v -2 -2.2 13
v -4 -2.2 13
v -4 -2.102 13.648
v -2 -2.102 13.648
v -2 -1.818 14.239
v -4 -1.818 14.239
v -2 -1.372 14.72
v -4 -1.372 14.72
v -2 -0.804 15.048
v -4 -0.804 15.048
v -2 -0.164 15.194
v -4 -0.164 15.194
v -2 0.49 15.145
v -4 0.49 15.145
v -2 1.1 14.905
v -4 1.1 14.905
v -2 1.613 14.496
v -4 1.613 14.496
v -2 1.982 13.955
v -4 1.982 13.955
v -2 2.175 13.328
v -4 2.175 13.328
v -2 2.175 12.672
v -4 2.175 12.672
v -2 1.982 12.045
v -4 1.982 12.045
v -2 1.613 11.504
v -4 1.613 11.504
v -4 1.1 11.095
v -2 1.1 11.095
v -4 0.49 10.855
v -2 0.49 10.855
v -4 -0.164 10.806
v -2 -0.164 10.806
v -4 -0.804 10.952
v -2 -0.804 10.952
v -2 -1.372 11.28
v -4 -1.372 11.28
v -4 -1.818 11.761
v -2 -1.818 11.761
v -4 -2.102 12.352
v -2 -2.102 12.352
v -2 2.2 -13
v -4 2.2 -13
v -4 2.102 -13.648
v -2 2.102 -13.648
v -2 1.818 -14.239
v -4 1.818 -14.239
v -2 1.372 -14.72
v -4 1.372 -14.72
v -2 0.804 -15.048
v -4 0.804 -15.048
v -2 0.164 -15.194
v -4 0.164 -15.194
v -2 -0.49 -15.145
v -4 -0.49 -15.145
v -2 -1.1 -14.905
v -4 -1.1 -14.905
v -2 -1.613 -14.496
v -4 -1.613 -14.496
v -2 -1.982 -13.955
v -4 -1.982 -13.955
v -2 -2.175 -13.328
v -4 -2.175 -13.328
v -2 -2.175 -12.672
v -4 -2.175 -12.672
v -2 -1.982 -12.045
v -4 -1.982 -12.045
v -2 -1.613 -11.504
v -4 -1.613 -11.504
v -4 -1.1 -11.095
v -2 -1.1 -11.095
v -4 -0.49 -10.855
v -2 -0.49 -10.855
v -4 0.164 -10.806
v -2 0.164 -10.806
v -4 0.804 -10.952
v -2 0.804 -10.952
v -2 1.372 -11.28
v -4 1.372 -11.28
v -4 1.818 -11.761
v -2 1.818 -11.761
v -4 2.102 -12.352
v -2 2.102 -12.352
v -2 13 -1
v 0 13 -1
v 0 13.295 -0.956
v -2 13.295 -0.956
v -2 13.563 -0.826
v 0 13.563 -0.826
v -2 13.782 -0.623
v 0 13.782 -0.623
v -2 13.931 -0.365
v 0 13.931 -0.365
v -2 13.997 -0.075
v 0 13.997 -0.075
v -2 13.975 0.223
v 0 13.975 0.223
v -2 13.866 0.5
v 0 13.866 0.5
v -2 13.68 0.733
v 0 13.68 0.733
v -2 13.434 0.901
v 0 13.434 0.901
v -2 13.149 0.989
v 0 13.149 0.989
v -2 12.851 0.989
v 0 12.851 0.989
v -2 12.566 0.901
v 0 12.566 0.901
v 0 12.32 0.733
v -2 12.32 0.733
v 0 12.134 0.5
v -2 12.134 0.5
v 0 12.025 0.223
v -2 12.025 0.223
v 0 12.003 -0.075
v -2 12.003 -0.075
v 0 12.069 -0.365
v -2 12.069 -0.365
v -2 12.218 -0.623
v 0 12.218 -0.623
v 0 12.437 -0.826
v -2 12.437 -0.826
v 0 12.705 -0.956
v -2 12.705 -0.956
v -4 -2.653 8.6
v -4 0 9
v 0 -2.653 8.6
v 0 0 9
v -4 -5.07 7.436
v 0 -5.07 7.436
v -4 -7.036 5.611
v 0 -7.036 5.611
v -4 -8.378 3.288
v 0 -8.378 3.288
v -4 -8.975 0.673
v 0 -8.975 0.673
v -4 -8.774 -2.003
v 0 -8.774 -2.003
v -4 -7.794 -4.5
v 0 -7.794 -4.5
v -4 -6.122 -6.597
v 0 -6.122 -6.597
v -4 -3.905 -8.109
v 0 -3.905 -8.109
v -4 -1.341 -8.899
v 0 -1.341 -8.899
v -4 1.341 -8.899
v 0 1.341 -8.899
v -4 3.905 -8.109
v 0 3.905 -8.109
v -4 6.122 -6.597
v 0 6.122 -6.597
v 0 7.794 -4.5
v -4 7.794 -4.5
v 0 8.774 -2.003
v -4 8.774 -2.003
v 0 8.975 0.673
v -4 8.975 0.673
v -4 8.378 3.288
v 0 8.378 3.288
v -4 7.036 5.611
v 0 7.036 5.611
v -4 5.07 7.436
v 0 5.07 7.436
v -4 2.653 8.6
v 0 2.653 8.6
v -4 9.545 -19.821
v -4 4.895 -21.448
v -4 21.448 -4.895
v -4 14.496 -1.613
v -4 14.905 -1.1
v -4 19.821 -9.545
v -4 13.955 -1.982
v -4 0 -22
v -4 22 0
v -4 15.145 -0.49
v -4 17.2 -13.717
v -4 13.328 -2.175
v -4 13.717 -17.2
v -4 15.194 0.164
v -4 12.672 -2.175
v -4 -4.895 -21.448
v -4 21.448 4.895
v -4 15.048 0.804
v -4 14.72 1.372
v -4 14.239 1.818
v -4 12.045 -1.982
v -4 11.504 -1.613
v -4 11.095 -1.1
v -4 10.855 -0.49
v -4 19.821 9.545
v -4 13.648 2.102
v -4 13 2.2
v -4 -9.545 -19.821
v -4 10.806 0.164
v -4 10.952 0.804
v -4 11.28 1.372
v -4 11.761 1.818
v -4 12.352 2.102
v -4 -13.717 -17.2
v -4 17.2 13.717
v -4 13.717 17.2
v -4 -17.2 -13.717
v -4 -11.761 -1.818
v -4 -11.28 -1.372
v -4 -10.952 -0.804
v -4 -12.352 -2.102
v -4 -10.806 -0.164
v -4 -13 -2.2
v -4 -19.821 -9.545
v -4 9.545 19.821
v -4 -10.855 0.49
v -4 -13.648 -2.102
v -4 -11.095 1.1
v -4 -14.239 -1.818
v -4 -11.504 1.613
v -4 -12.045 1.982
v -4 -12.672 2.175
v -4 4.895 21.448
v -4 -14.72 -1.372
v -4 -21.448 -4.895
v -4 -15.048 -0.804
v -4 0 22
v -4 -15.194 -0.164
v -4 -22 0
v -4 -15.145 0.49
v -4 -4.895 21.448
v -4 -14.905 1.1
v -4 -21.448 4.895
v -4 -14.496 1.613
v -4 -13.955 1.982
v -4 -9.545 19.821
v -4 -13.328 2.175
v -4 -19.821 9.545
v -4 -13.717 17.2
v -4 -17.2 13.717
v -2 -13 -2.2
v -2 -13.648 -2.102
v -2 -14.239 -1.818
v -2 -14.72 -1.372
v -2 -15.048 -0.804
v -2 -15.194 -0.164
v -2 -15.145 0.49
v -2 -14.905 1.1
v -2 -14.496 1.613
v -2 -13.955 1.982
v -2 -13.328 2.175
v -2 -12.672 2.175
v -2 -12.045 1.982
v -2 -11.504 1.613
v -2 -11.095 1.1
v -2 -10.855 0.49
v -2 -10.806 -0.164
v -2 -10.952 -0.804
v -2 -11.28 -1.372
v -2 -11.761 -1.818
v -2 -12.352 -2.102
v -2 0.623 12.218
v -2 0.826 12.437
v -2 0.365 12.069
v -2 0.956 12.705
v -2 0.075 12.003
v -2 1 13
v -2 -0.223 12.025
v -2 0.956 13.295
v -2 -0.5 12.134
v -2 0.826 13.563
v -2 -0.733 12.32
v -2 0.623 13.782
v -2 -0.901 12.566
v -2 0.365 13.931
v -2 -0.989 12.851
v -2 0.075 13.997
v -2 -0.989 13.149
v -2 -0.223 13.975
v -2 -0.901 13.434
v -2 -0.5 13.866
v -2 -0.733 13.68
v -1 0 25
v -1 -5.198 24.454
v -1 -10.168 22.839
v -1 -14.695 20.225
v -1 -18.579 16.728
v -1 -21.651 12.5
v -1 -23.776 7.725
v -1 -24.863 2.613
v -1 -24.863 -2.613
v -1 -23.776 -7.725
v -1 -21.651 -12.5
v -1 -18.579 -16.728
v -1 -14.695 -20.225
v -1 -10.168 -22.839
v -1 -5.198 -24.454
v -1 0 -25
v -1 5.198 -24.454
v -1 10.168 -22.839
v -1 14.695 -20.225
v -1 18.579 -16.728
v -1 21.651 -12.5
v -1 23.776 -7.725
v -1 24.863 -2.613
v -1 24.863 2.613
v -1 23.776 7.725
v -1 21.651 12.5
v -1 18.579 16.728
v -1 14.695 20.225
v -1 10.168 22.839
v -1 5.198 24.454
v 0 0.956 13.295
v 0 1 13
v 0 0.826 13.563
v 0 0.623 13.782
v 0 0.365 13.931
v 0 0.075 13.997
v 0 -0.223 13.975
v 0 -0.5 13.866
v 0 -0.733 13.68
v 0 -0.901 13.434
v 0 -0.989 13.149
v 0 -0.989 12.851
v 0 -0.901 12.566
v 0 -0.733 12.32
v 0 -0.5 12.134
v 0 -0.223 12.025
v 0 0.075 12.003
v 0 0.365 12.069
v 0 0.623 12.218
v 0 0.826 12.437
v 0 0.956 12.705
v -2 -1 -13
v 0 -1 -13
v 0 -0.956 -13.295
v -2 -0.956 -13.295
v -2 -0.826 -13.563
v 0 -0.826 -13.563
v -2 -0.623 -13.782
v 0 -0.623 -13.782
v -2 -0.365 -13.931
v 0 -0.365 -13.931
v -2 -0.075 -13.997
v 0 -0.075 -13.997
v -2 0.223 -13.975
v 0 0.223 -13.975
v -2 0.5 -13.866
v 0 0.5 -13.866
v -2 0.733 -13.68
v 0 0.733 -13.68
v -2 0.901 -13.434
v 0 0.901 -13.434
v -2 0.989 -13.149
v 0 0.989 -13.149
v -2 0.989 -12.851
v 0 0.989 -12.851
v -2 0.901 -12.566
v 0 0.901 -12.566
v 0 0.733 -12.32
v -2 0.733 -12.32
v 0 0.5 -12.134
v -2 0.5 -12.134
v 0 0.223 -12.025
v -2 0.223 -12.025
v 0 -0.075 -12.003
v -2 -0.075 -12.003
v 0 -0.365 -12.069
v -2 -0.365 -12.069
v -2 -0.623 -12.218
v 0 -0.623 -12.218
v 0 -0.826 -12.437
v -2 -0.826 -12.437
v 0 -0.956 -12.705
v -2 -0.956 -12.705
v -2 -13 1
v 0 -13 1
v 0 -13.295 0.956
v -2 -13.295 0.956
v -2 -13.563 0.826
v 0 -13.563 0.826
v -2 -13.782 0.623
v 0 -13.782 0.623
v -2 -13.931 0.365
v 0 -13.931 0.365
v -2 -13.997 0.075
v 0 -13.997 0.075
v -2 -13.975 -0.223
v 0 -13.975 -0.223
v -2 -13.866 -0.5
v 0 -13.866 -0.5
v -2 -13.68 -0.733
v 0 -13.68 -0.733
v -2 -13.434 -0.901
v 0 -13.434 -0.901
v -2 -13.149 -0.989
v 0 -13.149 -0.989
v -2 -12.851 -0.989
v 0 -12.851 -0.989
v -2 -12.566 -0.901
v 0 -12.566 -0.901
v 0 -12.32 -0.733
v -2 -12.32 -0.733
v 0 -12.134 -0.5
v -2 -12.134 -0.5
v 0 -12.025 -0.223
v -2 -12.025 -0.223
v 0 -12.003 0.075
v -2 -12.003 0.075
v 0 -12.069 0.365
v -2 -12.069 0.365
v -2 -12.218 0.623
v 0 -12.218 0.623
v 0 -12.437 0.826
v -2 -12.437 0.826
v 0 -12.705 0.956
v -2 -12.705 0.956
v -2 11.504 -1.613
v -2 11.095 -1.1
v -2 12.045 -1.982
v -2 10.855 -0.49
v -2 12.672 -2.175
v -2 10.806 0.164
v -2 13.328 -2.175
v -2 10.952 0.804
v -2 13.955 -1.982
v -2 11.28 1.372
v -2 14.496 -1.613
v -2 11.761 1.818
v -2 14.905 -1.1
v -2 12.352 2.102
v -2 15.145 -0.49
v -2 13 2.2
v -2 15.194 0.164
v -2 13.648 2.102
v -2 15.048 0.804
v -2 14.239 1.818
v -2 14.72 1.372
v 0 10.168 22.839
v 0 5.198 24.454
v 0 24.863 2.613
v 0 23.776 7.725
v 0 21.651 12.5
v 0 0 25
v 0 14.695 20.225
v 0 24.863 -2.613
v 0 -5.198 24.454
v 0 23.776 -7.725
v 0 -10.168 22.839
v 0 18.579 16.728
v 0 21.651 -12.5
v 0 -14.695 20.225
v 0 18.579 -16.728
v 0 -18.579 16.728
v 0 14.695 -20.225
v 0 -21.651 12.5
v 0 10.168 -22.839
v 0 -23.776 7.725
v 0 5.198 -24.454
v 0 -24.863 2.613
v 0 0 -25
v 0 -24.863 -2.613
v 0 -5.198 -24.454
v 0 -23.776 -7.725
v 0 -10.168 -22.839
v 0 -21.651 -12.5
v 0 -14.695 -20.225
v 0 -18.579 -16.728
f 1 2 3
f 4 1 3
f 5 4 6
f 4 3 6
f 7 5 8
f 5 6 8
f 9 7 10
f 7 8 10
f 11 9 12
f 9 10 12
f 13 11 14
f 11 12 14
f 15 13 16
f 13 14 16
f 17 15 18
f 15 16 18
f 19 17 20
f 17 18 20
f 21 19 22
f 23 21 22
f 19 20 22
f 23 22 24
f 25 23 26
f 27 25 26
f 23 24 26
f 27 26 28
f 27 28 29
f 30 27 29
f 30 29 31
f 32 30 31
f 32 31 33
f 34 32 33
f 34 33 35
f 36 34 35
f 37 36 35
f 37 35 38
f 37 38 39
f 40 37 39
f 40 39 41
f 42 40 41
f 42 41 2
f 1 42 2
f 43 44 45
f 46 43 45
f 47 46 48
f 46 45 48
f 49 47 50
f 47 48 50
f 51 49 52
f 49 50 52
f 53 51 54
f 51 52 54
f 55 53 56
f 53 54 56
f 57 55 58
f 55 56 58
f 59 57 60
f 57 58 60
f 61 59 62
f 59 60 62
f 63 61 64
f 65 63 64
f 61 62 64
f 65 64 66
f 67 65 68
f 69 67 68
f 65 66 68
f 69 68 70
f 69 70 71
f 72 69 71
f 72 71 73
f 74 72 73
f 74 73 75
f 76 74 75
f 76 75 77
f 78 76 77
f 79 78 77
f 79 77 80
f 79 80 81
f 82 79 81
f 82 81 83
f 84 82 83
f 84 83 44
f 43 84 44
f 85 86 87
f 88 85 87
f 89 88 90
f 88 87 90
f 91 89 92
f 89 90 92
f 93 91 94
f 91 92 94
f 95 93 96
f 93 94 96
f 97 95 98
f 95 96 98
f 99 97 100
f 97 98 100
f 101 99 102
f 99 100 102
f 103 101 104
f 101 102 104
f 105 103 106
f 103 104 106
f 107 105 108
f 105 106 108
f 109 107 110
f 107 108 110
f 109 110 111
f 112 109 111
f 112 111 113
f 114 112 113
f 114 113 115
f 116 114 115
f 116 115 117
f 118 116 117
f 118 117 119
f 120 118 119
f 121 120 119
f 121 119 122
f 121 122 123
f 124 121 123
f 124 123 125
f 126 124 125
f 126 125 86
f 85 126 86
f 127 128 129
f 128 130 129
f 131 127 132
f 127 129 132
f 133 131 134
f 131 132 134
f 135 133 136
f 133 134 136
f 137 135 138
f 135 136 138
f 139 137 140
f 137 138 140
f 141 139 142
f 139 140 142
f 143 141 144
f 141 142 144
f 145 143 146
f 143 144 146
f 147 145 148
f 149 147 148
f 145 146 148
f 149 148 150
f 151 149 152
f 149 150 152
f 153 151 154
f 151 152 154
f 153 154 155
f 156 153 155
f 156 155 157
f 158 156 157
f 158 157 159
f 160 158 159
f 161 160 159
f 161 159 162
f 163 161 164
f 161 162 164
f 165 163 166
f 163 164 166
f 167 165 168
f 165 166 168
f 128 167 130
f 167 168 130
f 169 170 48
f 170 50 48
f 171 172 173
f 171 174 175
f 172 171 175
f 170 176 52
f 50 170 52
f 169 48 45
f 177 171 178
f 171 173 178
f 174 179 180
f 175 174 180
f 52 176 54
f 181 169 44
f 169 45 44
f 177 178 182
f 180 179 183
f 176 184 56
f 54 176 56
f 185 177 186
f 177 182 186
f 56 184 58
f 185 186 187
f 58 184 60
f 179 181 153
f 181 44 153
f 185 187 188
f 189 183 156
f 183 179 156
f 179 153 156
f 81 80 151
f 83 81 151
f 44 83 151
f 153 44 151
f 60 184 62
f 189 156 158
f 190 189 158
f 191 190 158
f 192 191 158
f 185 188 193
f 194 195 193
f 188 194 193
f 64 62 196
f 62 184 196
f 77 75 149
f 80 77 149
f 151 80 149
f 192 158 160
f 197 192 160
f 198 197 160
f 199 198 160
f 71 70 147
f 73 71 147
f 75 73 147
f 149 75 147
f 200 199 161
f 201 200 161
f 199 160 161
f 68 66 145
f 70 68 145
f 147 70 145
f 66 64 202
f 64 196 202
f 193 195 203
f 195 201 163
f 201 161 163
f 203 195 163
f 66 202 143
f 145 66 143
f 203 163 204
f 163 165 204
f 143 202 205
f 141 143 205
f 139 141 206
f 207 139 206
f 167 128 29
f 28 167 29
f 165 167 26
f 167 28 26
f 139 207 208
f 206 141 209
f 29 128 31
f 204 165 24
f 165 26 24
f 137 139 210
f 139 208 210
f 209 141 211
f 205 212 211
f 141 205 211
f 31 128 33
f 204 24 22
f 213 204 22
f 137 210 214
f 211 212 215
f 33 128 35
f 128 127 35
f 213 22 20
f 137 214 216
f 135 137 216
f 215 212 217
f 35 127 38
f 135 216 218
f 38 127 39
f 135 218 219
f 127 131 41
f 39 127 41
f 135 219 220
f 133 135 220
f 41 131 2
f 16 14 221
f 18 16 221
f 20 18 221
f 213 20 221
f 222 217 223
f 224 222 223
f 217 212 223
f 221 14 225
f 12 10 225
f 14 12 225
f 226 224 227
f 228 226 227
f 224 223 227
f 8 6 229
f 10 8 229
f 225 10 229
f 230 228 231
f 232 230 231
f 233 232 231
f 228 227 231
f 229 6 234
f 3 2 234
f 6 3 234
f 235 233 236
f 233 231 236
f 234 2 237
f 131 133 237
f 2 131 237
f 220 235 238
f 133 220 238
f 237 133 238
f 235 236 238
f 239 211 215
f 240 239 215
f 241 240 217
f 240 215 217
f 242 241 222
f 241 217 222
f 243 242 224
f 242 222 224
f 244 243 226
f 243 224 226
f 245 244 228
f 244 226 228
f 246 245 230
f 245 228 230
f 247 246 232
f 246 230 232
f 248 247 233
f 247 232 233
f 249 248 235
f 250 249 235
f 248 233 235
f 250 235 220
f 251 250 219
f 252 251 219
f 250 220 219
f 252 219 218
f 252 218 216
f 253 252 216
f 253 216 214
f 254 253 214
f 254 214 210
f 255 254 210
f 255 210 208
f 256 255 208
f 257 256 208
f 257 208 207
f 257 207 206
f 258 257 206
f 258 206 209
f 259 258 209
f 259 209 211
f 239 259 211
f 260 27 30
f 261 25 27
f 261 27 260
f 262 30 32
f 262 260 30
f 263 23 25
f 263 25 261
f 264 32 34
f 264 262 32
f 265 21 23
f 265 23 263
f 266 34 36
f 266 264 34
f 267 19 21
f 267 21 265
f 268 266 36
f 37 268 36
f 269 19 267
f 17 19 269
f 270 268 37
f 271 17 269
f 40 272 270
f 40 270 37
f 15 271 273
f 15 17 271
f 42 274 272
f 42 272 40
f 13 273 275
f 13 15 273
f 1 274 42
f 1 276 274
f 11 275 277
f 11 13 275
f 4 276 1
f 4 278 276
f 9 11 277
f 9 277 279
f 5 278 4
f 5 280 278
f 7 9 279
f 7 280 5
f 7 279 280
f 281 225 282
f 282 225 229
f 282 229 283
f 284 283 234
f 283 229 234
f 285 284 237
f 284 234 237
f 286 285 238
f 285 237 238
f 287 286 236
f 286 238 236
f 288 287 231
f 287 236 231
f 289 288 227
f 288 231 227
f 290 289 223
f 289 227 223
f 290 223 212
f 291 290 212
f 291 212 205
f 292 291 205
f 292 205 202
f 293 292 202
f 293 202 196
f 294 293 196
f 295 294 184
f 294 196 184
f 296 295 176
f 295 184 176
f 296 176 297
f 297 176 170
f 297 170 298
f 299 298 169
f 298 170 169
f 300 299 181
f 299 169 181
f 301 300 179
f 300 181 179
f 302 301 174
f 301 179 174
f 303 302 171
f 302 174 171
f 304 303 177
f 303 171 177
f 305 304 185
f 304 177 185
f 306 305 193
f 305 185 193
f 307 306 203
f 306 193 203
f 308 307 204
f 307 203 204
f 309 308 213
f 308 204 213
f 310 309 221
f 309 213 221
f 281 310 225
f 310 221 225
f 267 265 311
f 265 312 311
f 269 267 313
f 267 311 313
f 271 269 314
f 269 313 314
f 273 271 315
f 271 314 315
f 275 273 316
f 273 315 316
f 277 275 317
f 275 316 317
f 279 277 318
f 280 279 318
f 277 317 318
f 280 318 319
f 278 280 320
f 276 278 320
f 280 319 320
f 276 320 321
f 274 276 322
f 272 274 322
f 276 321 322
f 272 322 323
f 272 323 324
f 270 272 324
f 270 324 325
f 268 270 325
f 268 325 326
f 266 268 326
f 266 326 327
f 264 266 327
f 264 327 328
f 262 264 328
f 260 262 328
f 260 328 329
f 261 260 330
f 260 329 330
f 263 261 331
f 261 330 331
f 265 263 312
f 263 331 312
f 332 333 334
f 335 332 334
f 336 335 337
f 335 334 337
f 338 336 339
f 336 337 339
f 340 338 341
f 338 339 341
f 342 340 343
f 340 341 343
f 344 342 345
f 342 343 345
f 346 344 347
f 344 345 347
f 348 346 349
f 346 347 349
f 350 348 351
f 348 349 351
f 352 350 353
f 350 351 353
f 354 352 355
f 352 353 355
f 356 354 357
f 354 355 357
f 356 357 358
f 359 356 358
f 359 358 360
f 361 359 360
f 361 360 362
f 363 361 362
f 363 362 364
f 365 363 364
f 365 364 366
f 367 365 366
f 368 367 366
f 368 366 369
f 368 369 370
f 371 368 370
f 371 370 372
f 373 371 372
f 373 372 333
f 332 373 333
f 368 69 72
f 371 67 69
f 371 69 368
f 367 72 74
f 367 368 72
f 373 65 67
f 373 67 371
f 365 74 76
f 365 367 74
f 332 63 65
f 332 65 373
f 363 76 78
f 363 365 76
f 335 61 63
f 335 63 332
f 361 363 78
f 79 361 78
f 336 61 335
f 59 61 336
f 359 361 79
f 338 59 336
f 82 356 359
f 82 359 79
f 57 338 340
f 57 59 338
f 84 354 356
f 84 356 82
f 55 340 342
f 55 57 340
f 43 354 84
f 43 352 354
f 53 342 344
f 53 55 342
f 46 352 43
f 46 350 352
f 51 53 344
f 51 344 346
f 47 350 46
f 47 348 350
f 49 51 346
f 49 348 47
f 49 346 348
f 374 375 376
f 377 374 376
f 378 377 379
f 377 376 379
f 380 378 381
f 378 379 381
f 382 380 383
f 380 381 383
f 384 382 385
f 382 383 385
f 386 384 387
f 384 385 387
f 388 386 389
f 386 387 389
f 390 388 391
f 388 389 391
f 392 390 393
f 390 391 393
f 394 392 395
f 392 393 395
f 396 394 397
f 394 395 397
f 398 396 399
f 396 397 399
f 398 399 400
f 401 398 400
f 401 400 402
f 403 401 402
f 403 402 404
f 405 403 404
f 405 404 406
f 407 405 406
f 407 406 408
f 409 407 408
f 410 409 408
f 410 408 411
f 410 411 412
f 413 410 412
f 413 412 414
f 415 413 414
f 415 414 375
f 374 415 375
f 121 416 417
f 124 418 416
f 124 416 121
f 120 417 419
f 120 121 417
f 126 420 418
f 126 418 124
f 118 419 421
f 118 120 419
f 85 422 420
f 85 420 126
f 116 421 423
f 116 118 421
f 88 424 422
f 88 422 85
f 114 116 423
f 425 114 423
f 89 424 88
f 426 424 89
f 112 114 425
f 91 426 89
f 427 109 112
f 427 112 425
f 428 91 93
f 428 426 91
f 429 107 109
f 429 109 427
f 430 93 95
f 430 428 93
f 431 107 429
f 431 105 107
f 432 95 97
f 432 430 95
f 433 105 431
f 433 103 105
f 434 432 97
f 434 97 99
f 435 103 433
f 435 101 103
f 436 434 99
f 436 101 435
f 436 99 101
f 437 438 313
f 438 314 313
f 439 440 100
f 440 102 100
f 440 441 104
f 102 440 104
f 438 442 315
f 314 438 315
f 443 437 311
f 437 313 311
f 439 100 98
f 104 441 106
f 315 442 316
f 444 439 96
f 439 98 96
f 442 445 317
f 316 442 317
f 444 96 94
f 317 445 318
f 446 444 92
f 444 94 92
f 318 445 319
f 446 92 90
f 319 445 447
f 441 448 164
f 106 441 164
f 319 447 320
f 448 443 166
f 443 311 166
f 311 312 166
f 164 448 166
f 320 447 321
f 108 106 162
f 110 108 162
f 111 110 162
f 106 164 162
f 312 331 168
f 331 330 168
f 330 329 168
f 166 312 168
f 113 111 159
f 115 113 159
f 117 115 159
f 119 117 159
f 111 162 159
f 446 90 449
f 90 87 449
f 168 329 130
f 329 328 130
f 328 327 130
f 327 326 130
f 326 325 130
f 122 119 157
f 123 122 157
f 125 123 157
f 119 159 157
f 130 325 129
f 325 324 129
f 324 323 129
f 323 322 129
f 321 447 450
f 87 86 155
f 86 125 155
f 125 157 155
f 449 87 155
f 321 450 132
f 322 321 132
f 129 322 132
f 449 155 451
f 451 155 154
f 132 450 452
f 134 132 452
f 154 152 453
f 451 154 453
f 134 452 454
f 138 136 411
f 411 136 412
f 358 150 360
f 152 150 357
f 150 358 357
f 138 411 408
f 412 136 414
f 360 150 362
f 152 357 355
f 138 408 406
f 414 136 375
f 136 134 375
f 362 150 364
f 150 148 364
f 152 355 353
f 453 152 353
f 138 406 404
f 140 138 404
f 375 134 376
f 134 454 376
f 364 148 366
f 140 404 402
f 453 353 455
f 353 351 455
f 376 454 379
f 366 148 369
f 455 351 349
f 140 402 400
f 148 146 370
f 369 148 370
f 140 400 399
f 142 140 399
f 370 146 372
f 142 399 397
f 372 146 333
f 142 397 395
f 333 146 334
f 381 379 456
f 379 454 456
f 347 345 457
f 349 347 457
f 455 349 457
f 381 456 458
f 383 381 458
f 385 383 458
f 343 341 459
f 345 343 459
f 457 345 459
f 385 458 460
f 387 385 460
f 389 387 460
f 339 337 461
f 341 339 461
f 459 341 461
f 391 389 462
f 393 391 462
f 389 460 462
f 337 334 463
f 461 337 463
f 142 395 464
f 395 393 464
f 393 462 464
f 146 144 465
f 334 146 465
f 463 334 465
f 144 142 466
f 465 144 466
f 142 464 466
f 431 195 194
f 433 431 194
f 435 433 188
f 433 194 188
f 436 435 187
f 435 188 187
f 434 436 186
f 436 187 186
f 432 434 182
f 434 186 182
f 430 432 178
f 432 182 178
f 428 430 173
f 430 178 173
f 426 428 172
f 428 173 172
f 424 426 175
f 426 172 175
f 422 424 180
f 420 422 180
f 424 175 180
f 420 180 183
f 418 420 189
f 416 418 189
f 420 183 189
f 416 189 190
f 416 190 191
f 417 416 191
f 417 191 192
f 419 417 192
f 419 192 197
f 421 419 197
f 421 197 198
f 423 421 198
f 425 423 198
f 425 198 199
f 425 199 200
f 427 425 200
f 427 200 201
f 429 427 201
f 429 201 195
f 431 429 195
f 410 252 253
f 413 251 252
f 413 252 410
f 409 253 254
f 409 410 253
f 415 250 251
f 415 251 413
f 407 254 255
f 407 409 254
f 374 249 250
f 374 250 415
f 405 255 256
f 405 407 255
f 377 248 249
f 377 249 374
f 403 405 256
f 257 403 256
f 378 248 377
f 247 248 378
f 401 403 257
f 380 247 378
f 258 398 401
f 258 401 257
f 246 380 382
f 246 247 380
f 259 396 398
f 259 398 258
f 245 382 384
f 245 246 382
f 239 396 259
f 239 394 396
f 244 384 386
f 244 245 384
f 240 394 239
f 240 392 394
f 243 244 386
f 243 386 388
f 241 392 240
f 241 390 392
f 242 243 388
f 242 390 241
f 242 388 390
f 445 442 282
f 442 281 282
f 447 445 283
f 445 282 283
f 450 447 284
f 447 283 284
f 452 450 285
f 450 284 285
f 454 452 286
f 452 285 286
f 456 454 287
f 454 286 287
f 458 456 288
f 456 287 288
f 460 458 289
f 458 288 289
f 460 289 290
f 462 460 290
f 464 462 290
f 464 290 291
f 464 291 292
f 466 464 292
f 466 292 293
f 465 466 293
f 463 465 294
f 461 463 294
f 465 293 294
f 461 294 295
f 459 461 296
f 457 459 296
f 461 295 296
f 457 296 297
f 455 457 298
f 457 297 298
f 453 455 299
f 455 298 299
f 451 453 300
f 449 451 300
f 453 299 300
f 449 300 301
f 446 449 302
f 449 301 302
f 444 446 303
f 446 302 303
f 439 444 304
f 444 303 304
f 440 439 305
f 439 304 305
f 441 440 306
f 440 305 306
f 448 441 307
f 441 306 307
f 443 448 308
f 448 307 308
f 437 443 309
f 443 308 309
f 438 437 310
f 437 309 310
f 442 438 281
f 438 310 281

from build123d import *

# Parameters (mm, degrees)
F3_D            = 2
F3_DEPTH        = 4
F3_CBORE_D      = 4.4
F3_CBORE_DEPTH  = 2
F3_TIP          = 0.600860619
F3_COPIES_COUNT = 4


# Not quite as in the source:
# - a pattern or mirror of a feature is missing from the dataset's text; its kind, count and spacing are read off the source's solid


with BuildPart() as f1:
    # F0 (on Front) → F1 (revolve)
    with BuildSketch(Plane.XZ):
        Polygon((-4, 9), (0, 9), (0, 25), (-1, 25), (-4, 22), align=None)
    revolve(axis=Axis((-2, 0, 0), (1, 0, 0)))

    # F3
    with Locations(Plane(origin=(-4, 0, 0), x_dir=(0, -1, 0), z_dir=(-1, 0, 0))):
        with Locations((0, 13)):
            f3 = CounterBoreHole(F3_D / 2, F3_CBORE_D / 2, F3_CBORE_DEPTH, depth=F3_DEPTH)
            with Locations((0, 0, -(F3_DEPTH + F3_TIP / 2))):  # 118° drill point
                Cone(0, F3_D / 2, F3_TIP, mode=Mode.SUBTRACT)

    # F3_copies: F3 ×4 about axis
    f3_copies_axis = Axis((0, 0, 0), (1, 0, 0))
    for i in range(1, F3_COPIES_COUNT):
        add(f3.rotate(f3_copies_axis, i * 360 / F3_COPIES_COUNT), mode=Mode.SUBTRACT)


solid = f1.part
